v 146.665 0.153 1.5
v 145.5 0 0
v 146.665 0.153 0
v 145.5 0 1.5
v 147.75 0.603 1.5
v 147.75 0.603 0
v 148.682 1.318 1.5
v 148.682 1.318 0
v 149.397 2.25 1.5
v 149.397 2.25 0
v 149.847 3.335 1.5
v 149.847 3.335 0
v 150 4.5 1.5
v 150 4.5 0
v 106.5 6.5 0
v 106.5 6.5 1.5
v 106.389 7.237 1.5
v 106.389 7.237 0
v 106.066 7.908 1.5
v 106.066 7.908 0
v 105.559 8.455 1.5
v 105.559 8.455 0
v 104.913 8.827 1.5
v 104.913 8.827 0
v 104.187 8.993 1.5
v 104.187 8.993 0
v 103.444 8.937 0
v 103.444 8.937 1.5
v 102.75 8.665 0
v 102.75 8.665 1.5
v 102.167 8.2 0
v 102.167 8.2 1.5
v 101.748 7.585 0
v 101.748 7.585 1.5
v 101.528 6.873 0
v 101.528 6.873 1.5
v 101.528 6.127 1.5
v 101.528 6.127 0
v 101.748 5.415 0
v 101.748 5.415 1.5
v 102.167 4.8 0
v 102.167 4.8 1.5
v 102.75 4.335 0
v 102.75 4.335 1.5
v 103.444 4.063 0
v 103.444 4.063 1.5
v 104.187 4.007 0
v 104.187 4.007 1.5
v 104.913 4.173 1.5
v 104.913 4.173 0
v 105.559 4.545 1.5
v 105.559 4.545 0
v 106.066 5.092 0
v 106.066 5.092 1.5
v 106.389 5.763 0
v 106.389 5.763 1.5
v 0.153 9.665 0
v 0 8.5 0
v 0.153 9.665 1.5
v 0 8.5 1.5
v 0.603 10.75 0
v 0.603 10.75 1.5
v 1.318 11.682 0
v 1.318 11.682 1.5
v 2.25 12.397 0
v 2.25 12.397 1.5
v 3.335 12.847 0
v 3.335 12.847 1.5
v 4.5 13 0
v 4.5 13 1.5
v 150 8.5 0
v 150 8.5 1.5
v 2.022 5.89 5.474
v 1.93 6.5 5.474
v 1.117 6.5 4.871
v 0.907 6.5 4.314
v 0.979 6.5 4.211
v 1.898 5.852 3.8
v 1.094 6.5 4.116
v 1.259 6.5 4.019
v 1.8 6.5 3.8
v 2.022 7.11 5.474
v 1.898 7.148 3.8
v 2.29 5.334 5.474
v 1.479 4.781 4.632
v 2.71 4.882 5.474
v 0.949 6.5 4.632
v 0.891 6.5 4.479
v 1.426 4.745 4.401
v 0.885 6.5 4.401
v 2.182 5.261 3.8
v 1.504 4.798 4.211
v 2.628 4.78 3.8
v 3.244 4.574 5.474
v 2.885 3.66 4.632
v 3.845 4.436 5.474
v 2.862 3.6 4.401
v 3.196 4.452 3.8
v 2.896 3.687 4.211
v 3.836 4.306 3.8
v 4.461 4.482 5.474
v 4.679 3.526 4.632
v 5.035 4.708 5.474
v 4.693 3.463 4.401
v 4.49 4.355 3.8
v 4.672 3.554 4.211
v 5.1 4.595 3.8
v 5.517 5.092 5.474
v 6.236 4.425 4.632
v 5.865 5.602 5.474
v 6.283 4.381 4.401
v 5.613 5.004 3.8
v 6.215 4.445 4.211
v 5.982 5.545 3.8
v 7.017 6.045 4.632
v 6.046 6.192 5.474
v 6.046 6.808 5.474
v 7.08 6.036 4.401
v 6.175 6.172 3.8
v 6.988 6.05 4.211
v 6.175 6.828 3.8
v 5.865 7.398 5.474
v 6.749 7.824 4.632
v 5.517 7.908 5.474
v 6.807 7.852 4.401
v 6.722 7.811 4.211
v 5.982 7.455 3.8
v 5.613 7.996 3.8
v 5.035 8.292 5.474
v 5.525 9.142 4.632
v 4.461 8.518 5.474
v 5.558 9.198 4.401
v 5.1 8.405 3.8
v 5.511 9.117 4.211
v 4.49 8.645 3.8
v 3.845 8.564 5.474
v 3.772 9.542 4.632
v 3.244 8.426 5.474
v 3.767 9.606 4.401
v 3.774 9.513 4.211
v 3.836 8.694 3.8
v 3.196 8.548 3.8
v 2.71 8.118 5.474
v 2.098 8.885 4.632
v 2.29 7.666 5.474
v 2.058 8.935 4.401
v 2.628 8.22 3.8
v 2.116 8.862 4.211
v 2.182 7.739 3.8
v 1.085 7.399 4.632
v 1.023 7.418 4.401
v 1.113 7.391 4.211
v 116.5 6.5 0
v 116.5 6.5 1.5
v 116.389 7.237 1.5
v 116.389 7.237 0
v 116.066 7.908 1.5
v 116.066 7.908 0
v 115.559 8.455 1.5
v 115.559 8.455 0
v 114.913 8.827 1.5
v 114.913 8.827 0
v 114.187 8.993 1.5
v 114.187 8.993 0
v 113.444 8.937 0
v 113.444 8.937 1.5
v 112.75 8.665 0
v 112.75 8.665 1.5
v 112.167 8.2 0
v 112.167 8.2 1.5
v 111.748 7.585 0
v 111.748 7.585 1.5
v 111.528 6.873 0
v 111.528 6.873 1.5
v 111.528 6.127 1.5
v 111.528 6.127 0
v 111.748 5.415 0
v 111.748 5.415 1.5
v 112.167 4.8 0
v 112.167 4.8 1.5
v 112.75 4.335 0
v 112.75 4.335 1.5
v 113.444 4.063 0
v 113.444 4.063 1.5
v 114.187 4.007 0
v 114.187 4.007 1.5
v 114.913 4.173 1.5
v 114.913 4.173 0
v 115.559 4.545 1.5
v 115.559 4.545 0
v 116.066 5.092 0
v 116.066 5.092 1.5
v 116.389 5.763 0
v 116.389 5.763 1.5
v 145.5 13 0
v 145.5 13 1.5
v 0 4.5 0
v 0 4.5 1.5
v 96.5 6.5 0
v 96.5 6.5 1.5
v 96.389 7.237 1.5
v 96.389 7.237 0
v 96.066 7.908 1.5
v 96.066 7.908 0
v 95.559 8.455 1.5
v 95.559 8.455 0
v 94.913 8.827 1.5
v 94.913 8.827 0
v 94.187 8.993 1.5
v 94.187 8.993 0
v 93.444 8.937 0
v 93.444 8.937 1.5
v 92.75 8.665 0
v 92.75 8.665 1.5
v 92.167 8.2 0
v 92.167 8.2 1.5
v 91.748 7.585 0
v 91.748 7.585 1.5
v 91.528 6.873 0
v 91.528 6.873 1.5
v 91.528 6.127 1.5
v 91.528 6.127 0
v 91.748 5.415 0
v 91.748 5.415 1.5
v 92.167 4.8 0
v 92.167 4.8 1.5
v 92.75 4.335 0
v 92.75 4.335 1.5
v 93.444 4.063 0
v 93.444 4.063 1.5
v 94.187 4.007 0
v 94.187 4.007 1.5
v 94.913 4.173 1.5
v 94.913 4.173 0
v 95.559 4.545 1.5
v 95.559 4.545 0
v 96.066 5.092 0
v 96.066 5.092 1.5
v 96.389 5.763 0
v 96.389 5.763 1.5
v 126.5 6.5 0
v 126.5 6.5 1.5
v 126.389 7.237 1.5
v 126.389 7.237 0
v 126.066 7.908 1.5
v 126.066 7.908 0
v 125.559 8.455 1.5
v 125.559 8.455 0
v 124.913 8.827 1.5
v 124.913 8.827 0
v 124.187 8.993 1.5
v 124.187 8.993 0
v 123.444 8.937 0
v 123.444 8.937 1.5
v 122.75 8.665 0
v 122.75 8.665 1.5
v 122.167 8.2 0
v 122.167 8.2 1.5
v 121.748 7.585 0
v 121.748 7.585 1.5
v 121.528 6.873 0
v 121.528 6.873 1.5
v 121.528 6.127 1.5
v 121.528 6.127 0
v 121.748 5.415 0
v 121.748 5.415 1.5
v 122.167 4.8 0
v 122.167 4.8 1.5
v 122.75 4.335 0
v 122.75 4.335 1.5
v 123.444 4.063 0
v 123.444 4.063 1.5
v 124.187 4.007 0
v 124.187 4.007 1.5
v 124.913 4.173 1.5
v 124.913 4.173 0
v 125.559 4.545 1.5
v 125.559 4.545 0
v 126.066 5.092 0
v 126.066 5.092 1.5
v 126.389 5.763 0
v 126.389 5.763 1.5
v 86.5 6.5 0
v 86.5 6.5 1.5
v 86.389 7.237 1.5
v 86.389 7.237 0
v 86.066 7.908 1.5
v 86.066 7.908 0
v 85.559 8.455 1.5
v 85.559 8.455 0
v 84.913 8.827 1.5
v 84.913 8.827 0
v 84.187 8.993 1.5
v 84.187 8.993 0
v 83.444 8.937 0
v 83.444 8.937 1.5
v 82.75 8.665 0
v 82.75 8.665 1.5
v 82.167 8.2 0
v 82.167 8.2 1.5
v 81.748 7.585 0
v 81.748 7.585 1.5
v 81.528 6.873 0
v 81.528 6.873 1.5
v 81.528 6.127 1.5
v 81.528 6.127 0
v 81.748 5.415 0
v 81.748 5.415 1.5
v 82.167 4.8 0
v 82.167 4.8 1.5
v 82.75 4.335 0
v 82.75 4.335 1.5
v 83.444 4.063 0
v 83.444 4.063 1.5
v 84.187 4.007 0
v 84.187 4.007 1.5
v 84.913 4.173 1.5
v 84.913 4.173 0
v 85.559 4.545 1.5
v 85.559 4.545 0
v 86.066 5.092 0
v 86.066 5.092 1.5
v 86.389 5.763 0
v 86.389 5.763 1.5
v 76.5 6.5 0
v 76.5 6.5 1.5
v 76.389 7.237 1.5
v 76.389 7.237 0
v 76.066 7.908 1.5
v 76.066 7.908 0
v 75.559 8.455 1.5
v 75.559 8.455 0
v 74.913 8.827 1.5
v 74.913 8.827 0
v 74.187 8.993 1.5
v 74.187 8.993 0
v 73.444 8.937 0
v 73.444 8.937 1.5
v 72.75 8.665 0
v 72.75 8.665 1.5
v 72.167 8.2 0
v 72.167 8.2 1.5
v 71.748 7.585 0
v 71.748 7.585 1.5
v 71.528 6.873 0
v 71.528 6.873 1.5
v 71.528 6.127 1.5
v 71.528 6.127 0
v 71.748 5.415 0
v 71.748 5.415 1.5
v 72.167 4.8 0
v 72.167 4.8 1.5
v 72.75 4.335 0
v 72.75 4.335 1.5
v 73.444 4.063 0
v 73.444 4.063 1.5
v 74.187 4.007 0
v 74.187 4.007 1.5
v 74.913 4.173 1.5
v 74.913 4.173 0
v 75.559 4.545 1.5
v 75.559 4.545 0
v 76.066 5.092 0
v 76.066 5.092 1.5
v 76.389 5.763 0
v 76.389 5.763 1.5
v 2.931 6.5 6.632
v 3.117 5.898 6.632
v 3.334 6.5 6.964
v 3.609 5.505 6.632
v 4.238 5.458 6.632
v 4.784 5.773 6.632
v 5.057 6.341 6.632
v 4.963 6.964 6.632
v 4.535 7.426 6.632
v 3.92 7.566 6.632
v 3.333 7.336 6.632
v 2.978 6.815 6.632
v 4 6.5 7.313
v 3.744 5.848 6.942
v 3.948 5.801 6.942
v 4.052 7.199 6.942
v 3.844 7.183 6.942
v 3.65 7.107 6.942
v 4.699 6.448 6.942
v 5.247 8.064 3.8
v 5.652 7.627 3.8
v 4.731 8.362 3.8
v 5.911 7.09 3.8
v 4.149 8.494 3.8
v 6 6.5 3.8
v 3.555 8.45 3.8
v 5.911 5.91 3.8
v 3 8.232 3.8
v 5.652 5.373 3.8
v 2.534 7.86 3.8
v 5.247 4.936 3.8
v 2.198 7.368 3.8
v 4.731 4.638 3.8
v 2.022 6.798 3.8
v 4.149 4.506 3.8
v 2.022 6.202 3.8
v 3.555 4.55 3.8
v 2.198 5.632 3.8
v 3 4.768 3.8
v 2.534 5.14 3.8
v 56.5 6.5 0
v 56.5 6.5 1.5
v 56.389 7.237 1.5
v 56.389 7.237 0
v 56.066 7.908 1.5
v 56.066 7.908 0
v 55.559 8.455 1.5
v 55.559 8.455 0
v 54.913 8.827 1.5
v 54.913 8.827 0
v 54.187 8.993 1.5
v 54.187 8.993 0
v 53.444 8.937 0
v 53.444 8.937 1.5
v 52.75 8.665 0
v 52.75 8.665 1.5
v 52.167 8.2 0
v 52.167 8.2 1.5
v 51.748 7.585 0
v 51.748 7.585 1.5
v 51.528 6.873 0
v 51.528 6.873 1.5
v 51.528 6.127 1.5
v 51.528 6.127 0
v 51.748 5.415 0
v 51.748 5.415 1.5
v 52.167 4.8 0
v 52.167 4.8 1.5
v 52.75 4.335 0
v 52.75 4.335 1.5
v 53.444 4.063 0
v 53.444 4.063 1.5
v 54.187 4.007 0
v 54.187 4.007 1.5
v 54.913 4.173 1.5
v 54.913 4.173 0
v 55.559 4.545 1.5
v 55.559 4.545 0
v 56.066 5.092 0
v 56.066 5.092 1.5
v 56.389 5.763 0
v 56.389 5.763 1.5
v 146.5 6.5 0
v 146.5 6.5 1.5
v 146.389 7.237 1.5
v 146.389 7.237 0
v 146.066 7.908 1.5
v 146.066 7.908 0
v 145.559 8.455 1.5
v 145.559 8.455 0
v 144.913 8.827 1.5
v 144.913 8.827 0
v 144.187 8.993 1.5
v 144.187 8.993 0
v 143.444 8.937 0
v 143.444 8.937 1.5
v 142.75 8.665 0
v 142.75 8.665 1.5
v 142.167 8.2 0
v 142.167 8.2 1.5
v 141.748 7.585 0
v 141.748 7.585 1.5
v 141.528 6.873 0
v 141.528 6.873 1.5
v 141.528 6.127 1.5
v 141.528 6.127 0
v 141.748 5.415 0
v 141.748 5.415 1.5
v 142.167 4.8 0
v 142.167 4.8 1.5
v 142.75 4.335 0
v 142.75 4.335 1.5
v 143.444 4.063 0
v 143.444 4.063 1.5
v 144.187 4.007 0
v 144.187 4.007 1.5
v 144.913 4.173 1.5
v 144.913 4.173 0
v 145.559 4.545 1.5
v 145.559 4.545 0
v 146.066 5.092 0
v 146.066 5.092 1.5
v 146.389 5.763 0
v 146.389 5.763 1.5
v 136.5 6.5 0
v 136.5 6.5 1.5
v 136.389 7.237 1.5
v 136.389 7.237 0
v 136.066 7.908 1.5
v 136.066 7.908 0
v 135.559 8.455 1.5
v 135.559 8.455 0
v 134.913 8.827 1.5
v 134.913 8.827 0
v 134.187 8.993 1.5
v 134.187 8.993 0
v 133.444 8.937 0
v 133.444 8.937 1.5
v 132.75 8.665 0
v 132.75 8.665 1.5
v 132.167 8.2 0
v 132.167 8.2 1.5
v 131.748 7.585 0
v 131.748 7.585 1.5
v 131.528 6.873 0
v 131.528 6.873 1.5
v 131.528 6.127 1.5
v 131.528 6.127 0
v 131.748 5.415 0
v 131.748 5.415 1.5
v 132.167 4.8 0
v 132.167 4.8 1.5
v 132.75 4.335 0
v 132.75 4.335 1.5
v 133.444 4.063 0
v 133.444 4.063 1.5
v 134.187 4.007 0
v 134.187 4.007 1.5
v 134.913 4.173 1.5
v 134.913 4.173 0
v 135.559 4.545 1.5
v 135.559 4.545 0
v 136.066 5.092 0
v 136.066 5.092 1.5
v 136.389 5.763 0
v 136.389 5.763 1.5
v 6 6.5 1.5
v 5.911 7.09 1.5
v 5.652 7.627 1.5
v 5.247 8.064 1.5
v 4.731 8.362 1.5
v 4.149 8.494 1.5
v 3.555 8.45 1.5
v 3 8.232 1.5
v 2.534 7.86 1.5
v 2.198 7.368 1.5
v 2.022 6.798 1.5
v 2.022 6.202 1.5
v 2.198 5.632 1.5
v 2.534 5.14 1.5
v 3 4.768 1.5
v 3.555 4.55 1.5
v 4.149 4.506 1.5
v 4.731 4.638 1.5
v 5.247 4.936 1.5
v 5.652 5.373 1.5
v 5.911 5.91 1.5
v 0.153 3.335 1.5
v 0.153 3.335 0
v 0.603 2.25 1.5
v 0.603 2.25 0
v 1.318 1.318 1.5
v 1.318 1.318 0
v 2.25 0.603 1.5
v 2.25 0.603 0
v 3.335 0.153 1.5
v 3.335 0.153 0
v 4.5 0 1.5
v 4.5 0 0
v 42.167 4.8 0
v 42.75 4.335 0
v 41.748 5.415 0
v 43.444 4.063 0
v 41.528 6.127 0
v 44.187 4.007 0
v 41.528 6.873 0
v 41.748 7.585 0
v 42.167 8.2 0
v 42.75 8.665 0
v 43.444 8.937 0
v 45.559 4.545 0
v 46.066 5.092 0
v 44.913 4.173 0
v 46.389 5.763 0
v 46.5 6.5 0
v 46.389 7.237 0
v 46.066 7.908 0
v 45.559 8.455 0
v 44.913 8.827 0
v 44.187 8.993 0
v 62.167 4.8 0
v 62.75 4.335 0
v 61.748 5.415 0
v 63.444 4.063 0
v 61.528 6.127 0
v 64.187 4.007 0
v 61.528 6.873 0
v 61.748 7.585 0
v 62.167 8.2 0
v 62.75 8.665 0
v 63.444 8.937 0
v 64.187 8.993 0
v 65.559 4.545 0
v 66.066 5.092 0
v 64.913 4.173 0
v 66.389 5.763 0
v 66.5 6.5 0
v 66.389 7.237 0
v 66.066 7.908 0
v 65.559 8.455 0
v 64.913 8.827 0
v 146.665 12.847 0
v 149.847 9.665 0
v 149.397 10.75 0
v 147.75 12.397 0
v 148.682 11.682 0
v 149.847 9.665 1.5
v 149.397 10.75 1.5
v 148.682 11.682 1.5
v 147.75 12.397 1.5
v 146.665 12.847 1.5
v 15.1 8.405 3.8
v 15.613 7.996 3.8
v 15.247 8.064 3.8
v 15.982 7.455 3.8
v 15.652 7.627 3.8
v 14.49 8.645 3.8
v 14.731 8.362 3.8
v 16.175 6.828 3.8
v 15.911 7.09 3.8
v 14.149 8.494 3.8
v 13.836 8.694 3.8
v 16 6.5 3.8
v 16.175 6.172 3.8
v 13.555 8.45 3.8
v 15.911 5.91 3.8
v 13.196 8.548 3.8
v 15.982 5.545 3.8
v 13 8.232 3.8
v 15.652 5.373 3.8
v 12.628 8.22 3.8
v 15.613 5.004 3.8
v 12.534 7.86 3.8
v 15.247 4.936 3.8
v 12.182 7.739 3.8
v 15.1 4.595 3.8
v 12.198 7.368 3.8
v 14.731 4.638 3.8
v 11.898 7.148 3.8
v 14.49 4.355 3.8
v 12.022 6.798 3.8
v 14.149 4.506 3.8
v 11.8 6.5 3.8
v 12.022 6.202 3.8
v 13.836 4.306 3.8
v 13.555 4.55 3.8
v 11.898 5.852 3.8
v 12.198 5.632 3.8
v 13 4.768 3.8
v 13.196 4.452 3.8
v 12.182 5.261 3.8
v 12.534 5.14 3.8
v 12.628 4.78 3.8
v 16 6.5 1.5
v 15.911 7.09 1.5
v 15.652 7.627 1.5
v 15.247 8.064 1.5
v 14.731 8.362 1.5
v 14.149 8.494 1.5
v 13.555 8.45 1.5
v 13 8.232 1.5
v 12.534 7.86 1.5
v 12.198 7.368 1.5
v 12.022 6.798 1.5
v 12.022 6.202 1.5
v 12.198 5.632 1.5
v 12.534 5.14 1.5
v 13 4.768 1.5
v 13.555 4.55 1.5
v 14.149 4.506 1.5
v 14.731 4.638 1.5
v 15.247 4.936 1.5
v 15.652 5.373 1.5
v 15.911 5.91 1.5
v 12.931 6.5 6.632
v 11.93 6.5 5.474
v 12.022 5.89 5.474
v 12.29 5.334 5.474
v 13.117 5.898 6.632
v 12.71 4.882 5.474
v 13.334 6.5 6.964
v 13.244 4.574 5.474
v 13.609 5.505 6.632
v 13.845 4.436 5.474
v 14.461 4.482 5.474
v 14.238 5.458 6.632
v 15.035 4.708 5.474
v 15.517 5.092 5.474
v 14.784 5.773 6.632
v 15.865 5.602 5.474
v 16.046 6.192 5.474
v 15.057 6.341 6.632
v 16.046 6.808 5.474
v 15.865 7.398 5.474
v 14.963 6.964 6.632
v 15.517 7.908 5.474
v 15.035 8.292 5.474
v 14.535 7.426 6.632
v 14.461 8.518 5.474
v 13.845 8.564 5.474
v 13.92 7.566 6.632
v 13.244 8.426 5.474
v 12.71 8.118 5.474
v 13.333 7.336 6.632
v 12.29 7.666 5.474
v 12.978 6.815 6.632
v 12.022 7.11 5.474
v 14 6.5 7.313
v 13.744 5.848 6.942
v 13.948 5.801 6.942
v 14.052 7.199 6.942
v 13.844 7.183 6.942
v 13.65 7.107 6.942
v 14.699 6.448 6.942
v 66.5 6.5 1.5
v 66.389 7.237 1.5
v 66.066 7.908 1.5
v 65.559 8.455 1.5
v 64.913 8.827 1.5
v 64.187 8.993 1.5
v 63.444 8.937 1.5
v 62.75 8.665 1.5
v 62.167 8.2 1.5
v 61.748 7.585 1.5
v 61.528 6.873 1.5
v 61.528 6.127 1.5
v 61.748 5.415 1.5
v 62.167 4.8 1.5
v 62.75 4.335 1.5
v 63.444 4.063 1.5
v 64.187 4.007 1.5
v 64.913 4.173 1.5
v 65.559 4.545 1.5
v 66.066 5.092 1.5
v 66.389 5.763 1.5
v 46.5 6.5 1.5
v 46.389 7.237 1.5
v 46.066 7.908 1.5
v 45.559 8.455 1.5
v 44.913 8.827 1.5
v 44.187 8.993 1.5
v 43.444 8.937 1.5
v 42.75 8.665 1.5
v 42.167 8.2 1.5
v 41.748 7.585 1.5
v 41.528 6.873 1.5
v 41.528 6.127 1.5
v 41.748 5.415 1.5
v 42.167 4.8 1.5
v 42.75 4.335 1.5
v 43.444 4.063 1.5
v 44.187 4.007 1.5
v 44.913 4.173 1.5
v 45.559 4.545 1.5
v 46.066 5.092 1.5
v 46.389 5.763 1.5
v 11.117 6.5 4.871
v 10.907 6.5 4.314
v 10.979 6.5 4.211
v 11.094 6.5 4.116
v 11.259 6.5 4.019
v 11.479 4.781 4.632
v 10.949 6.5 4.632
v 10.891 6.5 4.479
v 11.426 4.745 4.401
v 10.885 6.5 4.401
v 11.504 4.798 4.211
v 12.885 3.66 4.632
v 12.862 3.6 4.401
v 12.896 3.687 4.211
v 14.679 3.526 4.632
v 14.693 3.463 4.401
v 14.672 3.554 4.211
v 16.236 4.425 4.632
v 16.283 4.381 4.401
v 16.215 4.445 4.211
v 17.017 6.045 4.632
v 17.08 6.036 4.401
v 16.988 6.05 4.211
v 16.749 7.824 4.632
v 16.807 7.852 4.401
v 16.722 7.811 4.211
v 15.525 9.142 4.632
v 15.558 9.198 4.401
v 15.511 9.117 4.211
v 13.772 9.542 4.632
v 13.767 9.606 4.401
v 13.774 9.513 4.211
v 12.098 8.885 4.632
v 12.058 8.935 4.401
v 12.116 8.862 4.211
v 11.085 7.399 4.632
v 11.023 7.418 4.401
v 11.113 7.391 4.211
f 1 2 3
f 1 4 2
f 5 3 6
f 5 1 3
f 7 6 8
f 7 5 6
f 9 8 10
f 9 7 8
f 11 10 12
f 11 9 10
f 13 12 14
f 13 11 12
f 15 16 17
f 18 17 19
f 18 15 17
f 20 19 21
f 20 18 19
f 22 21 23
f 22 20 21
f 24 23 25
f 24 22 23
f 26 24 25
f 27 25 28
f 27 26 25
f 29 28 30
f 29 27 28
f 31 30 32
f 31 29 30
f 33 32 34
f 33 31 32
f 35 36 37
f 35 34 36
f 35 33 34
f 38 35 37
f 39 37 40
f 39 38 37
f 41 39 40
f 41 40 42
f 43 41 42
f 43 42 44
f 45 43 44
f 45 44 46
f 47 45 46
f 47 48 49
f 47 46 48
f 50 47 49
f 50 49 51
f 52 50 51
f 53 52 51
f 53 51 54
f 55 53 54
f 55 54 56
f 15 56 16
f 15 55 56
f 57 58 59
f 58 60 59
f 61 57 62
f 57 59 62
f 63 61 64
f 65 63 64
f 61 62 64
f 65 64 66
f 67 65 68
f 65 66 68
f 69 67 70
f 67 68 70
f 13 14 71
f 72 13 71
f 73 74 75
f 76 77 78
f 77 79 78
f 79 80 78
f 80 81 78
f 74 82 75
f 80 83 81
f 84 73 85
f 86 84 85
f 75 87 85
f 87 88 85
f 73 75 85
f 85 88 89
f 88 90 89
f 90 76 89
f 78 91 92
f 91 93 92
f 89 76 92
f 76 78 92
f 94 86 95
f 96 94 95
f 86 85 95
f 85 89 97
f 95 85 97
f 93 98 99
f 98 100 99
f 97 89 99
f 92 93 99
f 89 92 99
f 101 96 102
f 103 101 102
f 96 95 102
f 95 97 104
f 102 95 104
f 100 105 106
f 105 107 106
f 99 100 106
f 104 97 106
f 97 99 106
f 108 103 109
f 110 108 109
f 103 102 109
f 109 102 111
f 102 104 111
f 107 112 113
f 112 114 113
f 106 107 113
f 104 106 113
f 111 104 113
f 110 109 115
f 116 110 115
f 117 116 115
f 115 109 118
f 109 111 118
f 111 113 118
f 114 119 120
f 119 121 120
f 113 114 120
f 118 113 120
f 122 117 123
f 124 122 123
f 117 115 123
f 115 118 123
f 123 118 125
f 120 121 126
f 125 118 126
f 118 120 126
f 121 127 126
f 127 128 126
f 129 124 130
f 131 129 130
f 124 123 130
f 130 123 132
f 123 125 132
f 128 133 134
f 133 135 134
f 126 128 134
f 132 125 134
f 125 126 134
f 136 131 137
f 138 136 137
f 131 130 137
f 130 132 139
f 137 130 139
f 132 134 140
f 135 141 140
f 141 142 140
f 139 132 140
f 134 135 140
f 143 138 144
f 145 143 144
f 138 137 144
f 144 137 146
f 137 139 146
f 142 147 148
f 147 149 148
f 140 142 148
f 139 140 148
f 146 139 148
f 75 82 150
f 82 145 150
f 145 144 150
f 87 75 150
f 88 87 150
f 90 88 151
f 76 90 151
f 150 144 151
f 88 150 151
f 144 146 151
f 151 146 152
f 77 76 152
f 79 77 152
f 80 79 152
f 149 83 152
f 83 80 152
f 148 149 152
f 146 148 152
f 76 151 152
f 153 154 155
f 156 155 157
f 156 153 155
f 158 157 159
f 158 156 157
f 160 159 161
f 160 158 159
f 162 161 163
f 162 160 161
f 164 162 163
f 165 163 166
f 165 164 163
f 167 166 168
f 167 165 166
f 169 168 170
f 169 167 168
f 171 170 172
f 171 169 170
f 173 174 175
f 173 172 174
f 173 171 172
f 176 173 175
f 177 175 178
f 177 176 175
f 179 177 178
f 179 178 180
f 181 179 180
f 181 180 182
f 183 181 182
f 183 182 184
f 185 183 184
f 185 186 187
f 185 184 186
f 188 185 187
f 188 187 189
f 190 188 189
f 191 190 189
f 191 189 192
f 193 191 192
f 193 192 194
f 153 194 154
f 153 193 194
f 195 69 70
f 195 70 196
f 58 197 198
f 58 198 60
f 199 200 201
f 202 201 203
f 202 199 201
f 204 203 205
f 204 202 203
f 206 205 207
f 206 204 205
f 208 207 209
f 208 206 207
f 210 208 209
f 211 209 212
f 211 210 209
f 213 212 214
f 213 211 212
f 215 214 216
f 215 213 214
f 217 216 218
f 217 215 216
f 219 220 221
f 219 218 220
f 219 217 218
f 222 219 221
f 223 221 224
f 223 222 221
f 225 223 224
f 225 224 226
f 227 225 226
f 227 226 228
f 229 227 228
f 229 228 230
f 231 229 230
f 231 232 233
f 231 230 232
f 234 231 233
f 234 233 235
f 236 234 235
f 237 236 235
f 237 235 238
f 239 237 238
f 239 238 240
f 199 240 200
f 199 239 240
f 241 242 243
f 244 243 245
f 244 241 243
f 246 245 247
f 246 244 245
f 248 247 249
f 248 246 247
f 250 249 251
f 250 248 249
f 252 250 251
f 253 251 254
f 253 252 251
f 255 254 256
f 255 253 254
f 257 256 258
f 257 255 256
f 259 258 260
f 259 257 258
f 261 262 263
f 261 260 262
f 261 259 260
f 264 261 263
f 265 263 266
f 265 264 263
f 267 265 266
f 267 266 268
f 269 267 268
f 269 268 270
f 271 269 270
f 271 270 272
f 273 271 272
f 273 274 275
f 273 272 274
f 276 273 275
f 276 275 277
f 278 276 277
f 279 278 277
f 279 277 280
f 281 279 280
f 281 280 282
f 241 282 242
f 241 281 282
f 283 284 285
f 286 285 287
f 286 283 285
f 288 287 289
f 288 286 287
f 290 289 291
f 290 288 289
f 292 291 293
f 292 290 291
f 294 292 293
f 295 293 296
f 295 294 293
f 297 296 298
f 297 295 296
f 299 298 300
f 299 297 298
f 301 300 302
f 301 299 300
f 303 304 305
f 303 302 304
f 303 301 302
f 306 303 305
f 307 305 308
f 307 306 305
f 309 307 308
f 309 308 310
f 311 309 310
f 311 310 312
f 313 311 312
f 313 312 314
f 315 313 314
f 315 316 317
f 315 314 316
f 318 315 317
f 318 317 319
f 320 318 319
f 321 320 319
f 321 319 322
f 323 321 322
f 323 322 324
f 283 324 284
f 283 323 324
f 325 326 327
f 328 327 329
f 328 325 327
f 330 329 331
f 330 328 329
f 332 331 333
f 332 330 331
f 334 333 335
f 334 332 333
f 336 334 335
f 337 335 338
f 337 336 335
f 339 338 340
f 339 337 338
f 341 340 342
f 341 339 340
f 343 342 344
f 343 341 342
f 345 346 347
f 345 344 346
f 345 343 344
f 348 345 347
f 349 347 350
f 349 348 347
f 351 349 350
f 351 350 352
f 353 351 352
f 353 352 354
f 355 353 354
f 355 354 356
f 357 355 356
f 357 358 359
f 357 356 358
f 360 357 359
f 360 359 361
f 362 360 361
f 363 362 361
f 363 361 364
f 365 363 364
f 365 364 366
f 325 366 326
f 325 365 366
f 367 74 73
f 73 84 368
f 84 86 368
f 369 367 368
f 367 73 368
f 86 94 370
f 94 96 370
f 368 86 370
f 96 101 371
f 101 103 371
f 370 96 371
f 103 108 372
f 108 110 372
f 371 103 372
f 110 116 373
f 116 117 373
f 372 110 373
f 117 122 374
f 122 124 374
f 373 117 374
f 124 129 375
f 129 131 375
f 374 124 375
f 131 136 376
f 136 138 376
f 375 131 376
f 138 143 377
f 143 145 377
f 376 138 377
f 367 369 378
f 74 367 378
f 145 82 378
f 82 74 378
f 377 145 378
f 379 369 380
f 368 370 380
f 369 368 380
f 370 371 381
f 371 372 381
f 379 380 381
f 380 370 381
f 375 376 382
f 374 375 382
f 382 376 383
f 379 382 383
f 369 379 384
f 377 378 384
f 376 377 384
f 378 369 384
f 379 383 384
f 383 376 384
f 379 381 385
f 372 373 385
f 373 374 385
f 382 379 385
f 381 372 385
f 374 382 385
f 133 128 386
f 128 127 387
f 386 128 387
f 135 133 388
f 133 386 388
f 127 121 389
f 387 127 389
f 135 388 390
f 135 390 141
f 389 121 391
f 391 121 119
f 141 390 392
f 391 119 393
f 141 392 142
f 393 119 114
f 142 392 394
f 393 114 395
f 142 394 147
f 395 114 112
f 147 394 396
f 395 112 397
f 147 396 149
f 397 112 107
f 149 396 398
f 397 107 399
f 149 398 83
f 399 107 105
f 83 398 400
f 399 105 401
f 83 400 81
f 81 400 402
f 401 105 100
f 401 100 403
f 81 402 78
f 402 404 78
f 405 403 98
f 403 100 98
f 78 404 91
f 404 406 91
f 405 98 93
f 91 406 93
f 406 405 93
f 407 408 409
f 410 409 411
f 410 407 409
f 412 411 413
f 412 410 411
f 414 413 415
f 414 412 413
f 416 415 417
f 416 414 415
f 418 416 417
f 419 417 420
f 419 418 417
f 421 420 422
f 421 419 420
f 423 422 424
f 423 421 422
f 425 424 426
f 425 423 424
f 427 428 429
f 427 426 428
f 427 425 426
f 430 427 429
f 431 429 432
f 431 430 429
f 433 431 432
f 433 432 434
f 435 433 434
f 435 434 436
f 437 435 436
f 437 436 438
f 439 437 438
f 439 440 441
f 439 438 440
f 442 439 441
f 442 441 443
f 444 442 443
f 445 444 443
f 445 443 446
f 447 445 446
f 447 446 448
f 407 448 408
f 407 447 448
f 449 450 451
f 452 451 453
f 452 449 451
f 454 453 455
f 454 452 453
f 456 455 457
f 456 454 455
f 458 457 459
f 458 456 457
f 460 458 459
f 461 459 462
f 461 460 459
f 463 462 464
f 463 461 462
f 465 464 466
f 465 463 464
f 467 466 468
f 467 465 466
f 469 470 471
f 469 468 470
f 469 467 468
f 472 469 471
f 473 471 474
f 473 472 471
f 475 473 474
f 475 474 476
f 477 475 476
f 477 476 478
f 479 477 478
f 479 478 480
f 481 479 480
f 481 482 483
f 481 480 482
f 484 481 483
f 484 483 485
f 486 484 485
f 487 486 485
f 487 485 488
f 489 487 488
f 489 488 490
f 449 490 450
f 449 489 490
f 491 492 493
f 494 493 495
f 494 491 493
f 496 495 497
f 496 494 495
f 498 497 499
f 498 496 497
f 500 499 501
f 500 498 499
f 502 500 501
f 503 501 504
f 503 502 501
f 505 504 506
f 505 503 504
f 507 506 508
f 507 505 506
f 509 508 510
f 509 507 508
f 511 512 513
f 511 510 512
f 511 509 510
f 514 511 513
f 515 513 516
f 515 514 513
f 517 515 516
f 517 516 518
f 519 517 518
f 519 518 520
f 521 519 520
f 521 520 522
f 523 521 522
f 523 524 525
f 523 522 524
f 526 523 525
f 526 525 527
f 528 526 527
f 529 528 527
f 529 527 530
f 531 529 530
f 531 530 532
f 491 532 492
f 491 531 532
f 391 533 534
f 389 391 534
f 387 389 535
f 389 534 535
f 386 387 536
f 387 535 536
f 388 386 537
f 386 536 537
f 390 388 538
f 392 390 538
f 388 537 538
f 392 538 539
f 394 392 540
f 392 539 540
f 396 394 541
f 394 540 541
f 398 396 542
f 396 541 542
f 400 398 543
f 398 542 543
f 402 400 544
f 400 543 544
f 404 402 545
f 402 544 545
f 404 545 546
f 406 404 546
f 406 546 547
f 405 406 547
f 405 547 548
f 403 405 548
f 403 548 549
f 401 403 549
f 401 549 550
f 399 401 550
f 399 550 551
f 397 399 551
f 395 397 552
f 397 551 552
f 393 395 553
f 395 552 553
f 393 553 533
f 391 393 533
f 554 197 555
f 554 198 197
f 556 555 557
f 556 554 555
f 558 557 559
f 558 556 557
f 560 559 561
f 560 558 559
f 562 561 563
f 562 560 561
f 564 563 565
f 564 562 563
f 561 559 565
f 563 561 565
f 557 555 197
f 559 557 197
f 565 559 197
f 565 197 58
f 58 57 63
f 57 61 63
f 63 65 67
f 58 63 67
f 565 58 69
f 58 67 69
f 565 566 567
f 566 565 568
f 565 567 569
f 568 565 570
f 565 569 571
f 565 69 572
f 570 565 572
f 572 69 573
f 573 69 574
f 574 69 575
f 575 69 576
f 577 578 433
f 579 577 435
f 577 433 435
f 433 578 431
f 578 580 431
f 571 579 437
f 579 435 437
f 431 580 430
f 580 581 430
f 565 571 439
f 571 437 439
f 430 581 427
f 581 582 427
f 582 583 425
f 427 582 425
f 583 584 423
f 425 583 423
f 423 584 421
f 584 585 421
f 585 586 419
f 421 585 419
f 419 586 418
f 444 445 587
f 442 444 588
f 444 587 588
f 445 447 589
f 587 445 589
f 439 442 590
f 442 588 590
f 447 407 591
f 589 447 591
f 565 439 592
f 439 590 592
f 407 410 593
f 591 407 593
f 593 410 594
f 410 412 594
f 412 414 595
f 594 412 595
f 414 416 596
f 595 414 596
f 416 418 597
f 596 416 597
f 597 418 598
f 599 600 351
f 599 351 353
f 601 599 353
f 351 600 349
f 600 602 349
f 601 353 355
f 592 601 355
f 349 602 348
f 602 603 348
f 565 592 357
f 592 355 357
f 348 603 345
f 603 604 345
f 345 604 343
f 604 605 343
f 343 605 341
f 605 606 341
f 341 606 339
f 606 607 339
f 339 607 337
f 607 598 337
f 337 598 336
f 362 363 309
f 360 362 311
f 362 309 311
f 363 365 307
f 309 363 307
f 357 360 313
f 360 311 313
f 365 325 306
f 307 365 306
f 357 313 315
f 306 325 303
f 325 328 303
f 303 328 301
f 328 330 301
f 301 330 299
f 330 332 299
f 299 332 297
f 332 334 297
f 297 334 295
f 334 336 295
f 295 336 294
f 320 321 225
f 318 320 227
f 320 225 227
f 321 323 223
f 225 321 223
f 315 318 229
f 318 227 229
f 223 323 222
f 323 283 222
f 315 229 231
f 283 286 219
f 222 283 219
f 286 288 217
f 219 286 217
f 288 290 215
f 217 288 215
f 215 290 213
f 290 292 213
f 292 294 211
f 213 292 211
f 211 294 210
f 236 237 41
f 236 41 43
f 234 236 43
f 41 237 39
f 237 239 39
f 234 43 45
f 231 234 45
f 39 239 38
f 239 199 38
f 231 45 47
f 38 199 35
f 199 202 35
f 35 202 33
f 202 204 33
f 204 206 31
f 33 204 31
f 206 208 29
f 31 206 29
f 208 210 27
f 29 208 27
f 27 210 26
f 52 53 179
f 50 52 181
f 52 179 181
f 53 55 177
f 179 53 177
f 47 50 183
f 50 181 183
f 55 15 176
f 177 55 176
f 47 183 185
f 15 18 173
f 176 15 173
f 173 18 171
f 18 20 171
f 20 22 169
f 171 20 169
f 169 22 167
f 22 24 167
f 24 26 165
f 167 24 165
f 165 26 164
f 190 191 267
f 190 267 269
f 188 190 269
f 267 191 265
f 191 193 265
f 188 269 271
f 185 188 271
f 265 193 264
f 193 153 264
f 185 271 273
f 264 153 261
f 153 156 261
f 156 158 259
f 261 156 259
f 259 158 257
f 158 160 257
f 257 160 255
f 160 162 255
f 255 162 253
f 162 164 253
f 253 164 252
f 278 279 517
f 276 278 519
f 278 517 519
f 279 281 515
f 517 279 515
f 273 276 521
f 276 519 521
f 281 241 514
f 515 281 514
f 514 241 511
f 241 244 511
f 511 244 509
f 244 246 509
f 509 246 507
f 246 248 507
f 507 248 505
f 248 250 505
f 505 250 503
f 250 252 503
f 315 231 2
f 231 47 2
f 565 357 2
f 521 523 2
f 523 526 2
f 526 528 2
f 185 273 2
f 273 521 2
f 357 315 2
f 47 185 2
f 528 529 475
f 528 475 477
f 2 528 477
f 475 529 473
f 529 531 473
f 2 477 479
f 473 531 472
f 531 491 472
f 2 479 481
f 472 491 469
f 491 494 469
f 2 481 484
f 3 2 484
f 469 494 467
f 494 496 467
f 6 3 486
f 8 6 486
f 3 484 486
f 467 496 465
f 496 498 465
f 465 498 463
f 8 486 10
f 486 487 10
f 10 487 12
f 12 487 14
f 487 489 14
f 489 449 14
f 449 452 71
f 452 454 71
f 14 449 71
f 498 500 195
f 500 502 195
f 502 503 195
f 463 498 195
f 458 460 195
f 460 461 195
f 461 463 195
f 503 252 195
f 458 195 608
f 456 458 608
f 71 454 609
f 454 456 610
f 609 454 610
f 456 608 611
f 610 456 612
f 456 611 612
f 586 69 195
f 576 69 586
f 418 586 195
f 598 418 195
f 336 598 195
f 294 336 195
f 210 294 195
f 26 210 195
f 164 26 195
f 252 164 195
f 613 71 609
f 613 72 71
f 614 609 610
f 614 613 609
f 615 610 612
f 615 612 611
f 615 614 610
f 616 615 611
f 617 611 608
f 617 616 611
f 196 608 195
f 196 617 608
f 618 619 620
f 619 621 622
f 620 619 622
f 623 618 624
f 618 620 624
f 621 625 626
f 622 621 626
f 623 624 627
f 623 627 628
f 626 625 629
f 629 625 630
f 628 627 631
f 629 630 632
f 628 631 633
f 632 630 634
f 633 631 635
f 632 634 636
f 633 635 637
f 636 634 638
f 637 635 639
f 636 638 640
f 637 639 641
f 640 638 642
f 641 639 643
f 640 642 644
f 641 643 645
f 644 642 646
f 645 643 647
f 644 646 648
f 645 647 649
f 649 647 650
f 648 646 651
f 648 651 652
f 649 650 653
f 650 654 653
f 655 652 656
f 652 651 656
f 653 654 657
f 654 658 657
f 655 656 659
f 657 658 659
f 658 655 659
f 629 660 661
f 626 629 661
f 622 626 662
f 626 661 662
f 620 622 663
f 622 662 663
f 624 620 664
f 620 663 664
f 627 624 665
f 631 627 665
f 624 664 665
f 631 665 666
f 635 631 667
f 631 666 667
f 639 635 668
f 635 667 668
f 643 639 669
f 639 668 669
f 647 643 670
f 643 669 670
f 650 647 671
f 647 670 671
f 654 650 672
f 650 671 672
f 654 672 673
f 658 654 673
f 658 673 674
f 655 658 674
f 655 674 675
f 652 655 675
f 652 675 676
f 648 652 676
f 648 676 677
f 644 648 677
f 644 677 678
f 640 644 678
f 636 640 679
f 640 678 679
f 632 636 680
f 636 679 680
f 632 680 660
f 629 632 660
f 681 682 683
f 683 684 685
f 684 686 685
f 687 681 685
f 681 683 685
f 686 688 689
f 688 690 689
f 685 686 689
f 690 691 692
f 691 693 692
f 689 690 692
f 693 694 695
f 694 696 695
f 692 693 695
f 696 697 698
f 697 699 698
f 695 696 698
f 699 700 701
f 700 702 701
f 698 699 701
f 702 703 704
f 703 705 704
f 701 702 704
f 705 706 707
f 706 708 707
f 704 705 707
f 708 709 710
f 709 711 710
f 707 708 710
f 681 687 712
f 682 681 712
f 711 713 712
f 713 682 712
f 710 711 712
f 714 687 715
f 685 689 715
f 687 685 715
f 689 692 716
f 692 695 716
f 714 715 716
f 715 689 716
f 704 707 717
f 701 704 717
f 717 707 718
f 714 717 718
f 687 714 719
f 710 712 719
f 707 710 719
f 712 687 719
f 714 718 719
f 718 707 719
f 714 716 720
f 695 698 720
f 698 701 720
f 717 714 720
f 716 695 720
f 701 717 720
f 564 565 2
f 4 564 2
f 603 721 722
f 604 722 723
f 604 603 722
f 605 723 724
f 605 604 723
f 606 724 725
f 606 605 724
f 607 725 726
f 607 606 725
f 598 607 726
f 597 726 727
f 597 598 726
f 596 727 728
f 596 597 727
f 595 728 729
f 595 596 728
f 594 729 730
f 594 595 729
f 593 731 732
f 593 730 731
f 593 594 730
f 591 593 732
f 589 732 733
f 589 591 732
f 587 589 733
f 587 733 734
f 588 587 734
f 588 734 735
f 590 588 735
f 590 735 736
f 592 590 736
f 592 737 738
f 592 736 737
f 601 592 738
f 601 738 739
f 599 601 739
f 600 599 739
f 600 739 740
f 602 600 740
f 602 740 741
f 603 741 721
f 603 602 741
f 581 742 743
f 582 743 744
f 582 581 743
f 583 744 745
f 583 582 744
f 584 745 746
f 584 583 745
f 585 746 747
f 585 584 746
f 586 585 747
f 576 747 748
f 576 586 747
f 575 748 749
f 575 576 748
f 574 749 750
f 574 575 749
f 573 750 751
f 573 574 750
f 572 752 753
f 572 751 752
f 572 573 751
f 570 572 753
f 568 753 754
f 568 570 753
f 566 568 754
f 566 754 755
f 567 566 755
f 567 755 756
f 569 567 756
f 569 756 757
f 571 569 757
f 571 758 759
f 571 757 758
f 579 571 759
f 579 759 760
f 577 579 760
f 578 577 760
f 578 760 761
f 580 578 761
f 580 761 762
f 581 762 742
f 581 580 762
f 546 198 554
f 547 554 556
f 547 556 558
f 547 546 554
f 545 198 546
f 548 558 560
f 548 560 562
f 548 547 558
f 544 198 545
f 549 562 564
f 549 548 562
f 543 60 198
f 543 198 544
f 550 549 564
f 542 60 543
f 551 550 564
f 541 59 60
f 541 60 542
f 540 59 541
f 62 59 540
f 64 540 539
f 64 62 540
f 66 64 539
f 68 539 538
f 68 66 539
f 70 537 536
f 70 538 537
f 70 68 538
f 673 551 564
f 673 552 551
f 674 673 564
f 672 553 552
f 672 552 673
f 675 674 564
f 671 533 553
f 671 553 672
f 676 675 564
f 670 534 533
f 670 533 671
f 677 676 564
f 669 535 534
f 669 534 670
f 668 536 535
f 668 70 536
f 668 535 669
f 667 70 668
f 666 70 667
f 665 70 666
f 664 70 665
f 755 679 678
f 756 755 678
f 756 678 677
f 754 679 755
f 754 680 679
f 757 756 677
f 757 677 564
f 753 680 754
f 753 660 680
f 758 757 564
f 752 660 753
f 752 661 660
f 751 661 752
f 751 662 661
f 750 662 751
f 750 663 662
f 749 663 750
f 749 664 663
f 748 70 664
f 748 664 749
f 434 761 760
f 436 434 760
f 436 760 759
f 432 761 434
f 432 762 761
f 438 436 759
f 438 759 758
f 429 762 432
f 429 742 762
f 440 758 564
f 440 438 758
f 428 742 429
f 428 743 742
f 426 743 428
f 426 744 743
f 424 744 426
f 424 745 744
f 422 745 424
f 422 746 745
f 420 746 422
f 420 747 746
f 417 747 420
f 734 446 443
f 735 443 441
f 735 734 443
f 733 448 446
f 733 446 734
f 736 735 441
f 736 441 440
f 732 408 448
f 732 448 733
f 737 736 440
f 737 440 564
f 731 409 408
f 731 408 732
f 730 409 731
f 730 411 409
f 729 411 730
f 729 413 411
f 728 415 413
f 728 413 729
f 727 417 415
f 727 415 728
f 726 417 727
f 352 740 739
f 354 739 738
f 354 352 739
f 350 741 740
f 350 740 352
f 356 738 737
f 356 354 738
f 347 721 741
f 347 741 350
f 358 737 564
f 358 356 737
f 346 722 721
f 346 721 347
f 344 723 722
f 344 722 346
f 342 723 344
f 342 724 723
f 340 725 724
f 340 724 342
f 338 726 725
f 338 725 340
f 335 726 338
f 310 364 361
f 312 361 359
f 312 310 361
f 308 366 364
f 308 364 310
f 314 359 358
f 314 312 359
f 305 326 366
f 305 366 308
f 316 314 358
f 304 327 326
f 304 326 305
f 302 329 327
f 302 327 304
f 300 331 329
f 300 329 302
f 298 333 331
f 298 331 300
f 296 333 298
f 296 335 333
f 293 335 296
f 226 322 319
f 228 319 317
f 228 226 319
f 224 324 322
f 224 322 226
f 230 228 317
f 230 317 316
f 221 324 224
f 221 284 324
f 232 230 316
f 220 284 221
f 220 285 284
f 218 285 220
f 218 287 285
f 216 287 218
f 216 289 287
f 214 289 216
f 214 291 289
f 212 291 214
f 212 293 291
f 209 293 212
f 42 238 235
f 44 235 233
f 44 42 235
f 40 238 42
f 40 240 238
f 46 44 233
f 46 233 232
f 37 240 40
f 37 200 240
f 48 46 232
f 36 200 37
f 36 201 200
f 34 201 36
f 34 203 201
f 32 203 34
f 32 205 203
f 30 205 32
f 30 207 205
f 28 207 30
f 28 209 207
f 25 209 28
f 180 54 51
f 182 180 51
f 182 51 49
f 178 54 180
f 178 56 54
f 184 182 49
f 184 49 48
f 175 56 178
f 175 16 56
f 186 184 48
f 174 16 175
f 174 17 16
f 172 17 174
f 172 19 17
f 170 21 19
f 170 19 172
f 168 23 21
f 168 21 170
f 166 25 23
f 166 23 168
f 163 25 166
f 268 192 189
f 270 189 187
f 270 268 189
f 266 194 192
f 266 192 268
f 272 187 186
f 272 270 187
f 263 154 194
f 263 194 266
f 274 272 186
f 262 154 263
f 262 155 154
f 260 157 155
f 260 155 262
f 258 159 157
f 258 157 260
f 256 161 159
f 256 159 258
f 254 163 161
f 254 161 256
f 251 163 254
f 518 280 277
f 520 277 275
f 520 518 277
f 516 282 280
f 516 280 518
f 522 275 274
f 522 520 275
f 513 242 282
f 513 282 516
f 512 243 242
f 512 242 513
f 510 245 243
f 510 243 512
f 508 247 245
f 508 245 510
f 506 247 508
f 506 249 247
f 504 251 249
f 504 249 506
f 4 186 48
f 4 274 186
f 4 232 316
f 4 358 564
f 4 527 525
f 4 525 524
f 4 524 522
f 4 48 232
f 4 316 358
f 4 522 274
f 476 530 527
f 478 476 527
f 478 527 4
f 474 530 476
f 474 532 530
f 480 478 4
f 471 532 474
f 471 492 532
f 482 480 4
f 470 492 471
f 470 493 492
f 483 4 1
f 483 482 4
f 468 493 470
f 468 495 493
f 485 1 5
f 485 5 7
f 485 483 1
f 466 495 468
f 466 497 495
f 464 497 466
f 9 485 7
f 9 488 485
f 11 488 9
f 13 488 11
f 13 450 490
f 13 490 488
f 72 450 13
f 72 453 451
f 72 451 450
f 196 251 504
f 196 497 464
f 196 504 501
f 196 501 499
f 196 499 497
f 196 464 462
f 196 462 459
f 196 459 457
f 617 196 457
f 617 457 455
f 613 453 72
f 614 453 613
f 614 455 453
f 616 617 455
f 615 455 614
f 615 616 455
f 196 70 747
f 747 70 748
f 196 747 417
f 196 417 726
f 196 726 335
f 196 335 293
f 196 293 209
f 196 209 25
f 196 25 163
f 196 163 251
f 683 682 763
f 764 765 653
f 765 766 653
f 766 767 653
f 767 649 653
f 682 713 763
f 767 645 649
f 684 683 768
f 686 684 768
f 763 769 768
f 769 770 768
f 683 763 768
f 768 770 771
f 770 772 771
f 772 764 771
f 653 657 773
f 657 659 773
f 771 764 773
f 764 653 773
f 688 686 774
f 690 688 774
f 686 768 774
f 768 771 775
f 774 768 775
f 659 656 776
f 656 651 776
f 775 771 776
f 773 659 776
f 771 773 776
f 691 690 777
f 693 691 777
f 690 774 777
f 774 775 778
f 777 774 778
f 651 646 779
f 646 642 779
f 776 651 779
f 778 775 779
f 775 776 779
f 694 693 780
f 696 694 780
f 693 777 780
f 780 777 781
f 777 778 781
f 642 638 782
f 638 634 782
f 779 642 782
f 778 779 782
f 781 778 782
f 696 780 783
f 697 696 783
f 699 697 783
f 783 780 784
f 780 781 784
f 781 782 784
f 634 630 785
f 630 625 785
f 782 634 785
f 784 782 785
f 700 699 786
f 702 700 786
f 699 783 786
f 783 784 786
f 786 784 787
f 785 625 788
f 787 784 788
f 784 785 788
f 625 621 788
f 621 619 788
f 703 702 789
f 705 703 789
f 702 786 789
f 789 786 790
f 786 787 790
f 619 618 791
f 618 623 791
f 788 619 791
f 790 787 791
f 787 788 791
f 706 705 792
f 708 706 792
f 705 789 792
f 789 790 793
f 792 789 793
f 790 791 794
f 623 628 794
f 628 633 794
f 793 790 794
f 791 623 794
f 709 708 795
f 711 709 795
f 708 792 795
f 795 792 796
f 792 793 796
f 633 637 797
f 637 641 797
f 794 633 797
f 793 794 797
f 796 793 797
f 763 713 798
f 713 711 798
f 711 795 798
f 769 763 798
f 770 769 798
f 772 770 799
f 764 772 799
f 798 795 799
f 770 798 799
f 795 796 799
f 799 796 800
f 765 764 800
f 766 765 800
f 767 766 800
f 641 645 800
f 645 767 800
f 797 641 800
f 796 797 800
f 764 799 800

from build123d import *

# Parameters (mm, degrees)
CYLINDER004_R     = 2
CYLINDER004_DEPTH = 2.3
ARRAY_X_COUNT     = 2
ARRAY_X_PITCH     = 10
CYLINDER003_R     = 2.5
CYLINDER003_DEPTH = 10
ARRAY001_X_COUNT  = 11
ARRAY001_X_PITCH  = 10
BOX001_W          = 150
BOX001_H          = 13
BOX001_DEPTH      = 1.5
FILLET001_R       = 4.5


with BuildPart() as button_clone:
    # Sketch → Revolve (revolve)
    with BuildSketch(Plane.XZ):
        with BuildLine():
            Line((-2.2, 0), (0, 0))
            Line((0, 0), (0, 3.513454))
            add(Edge.make_bspline(
                [(0, 3.513454), (-0.678463, 3.195757), (-0.989147, 2.937398), (-1.619509, 2.257916), (-2.069526, 1.674454)],
                knots=[0, 0, 0, 0, 0.5, 1, 1, 1, 1], degree=3))
            add(Edge.make_bspline(
                [(-2.069526, 1.674454), (-2.787947, 1.236244), (-3.158335, 0.790309), (-3.182894, 0.331863), (-2.2, 0)],
                knots=[0, 0, 0, 0, 0.5, 1, 1, 1, 1], degree=3))
        make_face()
    revolve(axis=Axis((0, 0, 0), (0, 0, 1)))


with BuildPart() as button_clone_1:
    # Body001 placement: moved
    add(button_clone.part.moved(Location((0, 0, 2.3))))


with BuildPart() as button_array:
    # Cylinder004 → Cylinder004 (new body)
    with BuildSketch(Plane.XY):
        Circle(CYLINDER004_R)
    extrude(amount=CYLINDER004_DEPTH)

    # Fusion002: union button clone
    add(button_clone_1.part)

    # Array X: button_array ×2


with BuildPart() as button_array_1:
    add(button_array.part)
    with Locations(*[(i * ARRAY_X_PITCH, 0, 0) for i in range(1, ARRAY_X_COUNT)]):
        add(button_array.part)


with BuildPart() as button_array_2:
    # Array placement: moved
    add(button_array_1.part.moved(Location((4, 6.5, 1.5))))


with BuildPart() as button_hole_array:
    # Cylinder003 → Cylinder003 (new body)
    with BuildSketch(Plane.XY):
        Circle(CYLINDER003_R)
    extrude(amount=CYLINDER003_DEPTH)

    # Array001 X: button hole array ×11


with BuildPart() as button_hole_array_1:
    add(button_hole_array.part)
    with Locations(*[(i * ARRAY001_X_PITCH, 0, 0) for i in range(1, ARRAY001_X_COUNT)]):
        add(button_hole_array.part)


with BuildPart() as button_hole_array_2:
    # Array001 placement: moved
    add(button_hole_array_1.part.moved(Location((44, 6.5, 0))))


with BuildPart() as strap_union:
    # Box001 → Box001 (new body)
    with BuildSketch(Plane.XY):
        with Locations((75, 6.5)):
            Rectangle(BOX001_W, BOX001_H)
    extrude(amount=BOX001_DEPTH)

    # Fillet001
    fillet001_edges = [strap_union.edges().sort_by_distance(p)[0] for p in [
        (0, 0, 0.75),
        (0, 13, 0.75),
        (150, 0, 0.75),
        (150, 13, 0.75),
    ]]
    fillet(fillet001_edges, radius=FILLET001_R)

    # Cut002: cut button hole array
    add(button_hole_array_2.part, mode=Mode.SUBTRACT)

    # Fusion001: union button_array
    add(button_array_2.part)


solid = strap_union.part
